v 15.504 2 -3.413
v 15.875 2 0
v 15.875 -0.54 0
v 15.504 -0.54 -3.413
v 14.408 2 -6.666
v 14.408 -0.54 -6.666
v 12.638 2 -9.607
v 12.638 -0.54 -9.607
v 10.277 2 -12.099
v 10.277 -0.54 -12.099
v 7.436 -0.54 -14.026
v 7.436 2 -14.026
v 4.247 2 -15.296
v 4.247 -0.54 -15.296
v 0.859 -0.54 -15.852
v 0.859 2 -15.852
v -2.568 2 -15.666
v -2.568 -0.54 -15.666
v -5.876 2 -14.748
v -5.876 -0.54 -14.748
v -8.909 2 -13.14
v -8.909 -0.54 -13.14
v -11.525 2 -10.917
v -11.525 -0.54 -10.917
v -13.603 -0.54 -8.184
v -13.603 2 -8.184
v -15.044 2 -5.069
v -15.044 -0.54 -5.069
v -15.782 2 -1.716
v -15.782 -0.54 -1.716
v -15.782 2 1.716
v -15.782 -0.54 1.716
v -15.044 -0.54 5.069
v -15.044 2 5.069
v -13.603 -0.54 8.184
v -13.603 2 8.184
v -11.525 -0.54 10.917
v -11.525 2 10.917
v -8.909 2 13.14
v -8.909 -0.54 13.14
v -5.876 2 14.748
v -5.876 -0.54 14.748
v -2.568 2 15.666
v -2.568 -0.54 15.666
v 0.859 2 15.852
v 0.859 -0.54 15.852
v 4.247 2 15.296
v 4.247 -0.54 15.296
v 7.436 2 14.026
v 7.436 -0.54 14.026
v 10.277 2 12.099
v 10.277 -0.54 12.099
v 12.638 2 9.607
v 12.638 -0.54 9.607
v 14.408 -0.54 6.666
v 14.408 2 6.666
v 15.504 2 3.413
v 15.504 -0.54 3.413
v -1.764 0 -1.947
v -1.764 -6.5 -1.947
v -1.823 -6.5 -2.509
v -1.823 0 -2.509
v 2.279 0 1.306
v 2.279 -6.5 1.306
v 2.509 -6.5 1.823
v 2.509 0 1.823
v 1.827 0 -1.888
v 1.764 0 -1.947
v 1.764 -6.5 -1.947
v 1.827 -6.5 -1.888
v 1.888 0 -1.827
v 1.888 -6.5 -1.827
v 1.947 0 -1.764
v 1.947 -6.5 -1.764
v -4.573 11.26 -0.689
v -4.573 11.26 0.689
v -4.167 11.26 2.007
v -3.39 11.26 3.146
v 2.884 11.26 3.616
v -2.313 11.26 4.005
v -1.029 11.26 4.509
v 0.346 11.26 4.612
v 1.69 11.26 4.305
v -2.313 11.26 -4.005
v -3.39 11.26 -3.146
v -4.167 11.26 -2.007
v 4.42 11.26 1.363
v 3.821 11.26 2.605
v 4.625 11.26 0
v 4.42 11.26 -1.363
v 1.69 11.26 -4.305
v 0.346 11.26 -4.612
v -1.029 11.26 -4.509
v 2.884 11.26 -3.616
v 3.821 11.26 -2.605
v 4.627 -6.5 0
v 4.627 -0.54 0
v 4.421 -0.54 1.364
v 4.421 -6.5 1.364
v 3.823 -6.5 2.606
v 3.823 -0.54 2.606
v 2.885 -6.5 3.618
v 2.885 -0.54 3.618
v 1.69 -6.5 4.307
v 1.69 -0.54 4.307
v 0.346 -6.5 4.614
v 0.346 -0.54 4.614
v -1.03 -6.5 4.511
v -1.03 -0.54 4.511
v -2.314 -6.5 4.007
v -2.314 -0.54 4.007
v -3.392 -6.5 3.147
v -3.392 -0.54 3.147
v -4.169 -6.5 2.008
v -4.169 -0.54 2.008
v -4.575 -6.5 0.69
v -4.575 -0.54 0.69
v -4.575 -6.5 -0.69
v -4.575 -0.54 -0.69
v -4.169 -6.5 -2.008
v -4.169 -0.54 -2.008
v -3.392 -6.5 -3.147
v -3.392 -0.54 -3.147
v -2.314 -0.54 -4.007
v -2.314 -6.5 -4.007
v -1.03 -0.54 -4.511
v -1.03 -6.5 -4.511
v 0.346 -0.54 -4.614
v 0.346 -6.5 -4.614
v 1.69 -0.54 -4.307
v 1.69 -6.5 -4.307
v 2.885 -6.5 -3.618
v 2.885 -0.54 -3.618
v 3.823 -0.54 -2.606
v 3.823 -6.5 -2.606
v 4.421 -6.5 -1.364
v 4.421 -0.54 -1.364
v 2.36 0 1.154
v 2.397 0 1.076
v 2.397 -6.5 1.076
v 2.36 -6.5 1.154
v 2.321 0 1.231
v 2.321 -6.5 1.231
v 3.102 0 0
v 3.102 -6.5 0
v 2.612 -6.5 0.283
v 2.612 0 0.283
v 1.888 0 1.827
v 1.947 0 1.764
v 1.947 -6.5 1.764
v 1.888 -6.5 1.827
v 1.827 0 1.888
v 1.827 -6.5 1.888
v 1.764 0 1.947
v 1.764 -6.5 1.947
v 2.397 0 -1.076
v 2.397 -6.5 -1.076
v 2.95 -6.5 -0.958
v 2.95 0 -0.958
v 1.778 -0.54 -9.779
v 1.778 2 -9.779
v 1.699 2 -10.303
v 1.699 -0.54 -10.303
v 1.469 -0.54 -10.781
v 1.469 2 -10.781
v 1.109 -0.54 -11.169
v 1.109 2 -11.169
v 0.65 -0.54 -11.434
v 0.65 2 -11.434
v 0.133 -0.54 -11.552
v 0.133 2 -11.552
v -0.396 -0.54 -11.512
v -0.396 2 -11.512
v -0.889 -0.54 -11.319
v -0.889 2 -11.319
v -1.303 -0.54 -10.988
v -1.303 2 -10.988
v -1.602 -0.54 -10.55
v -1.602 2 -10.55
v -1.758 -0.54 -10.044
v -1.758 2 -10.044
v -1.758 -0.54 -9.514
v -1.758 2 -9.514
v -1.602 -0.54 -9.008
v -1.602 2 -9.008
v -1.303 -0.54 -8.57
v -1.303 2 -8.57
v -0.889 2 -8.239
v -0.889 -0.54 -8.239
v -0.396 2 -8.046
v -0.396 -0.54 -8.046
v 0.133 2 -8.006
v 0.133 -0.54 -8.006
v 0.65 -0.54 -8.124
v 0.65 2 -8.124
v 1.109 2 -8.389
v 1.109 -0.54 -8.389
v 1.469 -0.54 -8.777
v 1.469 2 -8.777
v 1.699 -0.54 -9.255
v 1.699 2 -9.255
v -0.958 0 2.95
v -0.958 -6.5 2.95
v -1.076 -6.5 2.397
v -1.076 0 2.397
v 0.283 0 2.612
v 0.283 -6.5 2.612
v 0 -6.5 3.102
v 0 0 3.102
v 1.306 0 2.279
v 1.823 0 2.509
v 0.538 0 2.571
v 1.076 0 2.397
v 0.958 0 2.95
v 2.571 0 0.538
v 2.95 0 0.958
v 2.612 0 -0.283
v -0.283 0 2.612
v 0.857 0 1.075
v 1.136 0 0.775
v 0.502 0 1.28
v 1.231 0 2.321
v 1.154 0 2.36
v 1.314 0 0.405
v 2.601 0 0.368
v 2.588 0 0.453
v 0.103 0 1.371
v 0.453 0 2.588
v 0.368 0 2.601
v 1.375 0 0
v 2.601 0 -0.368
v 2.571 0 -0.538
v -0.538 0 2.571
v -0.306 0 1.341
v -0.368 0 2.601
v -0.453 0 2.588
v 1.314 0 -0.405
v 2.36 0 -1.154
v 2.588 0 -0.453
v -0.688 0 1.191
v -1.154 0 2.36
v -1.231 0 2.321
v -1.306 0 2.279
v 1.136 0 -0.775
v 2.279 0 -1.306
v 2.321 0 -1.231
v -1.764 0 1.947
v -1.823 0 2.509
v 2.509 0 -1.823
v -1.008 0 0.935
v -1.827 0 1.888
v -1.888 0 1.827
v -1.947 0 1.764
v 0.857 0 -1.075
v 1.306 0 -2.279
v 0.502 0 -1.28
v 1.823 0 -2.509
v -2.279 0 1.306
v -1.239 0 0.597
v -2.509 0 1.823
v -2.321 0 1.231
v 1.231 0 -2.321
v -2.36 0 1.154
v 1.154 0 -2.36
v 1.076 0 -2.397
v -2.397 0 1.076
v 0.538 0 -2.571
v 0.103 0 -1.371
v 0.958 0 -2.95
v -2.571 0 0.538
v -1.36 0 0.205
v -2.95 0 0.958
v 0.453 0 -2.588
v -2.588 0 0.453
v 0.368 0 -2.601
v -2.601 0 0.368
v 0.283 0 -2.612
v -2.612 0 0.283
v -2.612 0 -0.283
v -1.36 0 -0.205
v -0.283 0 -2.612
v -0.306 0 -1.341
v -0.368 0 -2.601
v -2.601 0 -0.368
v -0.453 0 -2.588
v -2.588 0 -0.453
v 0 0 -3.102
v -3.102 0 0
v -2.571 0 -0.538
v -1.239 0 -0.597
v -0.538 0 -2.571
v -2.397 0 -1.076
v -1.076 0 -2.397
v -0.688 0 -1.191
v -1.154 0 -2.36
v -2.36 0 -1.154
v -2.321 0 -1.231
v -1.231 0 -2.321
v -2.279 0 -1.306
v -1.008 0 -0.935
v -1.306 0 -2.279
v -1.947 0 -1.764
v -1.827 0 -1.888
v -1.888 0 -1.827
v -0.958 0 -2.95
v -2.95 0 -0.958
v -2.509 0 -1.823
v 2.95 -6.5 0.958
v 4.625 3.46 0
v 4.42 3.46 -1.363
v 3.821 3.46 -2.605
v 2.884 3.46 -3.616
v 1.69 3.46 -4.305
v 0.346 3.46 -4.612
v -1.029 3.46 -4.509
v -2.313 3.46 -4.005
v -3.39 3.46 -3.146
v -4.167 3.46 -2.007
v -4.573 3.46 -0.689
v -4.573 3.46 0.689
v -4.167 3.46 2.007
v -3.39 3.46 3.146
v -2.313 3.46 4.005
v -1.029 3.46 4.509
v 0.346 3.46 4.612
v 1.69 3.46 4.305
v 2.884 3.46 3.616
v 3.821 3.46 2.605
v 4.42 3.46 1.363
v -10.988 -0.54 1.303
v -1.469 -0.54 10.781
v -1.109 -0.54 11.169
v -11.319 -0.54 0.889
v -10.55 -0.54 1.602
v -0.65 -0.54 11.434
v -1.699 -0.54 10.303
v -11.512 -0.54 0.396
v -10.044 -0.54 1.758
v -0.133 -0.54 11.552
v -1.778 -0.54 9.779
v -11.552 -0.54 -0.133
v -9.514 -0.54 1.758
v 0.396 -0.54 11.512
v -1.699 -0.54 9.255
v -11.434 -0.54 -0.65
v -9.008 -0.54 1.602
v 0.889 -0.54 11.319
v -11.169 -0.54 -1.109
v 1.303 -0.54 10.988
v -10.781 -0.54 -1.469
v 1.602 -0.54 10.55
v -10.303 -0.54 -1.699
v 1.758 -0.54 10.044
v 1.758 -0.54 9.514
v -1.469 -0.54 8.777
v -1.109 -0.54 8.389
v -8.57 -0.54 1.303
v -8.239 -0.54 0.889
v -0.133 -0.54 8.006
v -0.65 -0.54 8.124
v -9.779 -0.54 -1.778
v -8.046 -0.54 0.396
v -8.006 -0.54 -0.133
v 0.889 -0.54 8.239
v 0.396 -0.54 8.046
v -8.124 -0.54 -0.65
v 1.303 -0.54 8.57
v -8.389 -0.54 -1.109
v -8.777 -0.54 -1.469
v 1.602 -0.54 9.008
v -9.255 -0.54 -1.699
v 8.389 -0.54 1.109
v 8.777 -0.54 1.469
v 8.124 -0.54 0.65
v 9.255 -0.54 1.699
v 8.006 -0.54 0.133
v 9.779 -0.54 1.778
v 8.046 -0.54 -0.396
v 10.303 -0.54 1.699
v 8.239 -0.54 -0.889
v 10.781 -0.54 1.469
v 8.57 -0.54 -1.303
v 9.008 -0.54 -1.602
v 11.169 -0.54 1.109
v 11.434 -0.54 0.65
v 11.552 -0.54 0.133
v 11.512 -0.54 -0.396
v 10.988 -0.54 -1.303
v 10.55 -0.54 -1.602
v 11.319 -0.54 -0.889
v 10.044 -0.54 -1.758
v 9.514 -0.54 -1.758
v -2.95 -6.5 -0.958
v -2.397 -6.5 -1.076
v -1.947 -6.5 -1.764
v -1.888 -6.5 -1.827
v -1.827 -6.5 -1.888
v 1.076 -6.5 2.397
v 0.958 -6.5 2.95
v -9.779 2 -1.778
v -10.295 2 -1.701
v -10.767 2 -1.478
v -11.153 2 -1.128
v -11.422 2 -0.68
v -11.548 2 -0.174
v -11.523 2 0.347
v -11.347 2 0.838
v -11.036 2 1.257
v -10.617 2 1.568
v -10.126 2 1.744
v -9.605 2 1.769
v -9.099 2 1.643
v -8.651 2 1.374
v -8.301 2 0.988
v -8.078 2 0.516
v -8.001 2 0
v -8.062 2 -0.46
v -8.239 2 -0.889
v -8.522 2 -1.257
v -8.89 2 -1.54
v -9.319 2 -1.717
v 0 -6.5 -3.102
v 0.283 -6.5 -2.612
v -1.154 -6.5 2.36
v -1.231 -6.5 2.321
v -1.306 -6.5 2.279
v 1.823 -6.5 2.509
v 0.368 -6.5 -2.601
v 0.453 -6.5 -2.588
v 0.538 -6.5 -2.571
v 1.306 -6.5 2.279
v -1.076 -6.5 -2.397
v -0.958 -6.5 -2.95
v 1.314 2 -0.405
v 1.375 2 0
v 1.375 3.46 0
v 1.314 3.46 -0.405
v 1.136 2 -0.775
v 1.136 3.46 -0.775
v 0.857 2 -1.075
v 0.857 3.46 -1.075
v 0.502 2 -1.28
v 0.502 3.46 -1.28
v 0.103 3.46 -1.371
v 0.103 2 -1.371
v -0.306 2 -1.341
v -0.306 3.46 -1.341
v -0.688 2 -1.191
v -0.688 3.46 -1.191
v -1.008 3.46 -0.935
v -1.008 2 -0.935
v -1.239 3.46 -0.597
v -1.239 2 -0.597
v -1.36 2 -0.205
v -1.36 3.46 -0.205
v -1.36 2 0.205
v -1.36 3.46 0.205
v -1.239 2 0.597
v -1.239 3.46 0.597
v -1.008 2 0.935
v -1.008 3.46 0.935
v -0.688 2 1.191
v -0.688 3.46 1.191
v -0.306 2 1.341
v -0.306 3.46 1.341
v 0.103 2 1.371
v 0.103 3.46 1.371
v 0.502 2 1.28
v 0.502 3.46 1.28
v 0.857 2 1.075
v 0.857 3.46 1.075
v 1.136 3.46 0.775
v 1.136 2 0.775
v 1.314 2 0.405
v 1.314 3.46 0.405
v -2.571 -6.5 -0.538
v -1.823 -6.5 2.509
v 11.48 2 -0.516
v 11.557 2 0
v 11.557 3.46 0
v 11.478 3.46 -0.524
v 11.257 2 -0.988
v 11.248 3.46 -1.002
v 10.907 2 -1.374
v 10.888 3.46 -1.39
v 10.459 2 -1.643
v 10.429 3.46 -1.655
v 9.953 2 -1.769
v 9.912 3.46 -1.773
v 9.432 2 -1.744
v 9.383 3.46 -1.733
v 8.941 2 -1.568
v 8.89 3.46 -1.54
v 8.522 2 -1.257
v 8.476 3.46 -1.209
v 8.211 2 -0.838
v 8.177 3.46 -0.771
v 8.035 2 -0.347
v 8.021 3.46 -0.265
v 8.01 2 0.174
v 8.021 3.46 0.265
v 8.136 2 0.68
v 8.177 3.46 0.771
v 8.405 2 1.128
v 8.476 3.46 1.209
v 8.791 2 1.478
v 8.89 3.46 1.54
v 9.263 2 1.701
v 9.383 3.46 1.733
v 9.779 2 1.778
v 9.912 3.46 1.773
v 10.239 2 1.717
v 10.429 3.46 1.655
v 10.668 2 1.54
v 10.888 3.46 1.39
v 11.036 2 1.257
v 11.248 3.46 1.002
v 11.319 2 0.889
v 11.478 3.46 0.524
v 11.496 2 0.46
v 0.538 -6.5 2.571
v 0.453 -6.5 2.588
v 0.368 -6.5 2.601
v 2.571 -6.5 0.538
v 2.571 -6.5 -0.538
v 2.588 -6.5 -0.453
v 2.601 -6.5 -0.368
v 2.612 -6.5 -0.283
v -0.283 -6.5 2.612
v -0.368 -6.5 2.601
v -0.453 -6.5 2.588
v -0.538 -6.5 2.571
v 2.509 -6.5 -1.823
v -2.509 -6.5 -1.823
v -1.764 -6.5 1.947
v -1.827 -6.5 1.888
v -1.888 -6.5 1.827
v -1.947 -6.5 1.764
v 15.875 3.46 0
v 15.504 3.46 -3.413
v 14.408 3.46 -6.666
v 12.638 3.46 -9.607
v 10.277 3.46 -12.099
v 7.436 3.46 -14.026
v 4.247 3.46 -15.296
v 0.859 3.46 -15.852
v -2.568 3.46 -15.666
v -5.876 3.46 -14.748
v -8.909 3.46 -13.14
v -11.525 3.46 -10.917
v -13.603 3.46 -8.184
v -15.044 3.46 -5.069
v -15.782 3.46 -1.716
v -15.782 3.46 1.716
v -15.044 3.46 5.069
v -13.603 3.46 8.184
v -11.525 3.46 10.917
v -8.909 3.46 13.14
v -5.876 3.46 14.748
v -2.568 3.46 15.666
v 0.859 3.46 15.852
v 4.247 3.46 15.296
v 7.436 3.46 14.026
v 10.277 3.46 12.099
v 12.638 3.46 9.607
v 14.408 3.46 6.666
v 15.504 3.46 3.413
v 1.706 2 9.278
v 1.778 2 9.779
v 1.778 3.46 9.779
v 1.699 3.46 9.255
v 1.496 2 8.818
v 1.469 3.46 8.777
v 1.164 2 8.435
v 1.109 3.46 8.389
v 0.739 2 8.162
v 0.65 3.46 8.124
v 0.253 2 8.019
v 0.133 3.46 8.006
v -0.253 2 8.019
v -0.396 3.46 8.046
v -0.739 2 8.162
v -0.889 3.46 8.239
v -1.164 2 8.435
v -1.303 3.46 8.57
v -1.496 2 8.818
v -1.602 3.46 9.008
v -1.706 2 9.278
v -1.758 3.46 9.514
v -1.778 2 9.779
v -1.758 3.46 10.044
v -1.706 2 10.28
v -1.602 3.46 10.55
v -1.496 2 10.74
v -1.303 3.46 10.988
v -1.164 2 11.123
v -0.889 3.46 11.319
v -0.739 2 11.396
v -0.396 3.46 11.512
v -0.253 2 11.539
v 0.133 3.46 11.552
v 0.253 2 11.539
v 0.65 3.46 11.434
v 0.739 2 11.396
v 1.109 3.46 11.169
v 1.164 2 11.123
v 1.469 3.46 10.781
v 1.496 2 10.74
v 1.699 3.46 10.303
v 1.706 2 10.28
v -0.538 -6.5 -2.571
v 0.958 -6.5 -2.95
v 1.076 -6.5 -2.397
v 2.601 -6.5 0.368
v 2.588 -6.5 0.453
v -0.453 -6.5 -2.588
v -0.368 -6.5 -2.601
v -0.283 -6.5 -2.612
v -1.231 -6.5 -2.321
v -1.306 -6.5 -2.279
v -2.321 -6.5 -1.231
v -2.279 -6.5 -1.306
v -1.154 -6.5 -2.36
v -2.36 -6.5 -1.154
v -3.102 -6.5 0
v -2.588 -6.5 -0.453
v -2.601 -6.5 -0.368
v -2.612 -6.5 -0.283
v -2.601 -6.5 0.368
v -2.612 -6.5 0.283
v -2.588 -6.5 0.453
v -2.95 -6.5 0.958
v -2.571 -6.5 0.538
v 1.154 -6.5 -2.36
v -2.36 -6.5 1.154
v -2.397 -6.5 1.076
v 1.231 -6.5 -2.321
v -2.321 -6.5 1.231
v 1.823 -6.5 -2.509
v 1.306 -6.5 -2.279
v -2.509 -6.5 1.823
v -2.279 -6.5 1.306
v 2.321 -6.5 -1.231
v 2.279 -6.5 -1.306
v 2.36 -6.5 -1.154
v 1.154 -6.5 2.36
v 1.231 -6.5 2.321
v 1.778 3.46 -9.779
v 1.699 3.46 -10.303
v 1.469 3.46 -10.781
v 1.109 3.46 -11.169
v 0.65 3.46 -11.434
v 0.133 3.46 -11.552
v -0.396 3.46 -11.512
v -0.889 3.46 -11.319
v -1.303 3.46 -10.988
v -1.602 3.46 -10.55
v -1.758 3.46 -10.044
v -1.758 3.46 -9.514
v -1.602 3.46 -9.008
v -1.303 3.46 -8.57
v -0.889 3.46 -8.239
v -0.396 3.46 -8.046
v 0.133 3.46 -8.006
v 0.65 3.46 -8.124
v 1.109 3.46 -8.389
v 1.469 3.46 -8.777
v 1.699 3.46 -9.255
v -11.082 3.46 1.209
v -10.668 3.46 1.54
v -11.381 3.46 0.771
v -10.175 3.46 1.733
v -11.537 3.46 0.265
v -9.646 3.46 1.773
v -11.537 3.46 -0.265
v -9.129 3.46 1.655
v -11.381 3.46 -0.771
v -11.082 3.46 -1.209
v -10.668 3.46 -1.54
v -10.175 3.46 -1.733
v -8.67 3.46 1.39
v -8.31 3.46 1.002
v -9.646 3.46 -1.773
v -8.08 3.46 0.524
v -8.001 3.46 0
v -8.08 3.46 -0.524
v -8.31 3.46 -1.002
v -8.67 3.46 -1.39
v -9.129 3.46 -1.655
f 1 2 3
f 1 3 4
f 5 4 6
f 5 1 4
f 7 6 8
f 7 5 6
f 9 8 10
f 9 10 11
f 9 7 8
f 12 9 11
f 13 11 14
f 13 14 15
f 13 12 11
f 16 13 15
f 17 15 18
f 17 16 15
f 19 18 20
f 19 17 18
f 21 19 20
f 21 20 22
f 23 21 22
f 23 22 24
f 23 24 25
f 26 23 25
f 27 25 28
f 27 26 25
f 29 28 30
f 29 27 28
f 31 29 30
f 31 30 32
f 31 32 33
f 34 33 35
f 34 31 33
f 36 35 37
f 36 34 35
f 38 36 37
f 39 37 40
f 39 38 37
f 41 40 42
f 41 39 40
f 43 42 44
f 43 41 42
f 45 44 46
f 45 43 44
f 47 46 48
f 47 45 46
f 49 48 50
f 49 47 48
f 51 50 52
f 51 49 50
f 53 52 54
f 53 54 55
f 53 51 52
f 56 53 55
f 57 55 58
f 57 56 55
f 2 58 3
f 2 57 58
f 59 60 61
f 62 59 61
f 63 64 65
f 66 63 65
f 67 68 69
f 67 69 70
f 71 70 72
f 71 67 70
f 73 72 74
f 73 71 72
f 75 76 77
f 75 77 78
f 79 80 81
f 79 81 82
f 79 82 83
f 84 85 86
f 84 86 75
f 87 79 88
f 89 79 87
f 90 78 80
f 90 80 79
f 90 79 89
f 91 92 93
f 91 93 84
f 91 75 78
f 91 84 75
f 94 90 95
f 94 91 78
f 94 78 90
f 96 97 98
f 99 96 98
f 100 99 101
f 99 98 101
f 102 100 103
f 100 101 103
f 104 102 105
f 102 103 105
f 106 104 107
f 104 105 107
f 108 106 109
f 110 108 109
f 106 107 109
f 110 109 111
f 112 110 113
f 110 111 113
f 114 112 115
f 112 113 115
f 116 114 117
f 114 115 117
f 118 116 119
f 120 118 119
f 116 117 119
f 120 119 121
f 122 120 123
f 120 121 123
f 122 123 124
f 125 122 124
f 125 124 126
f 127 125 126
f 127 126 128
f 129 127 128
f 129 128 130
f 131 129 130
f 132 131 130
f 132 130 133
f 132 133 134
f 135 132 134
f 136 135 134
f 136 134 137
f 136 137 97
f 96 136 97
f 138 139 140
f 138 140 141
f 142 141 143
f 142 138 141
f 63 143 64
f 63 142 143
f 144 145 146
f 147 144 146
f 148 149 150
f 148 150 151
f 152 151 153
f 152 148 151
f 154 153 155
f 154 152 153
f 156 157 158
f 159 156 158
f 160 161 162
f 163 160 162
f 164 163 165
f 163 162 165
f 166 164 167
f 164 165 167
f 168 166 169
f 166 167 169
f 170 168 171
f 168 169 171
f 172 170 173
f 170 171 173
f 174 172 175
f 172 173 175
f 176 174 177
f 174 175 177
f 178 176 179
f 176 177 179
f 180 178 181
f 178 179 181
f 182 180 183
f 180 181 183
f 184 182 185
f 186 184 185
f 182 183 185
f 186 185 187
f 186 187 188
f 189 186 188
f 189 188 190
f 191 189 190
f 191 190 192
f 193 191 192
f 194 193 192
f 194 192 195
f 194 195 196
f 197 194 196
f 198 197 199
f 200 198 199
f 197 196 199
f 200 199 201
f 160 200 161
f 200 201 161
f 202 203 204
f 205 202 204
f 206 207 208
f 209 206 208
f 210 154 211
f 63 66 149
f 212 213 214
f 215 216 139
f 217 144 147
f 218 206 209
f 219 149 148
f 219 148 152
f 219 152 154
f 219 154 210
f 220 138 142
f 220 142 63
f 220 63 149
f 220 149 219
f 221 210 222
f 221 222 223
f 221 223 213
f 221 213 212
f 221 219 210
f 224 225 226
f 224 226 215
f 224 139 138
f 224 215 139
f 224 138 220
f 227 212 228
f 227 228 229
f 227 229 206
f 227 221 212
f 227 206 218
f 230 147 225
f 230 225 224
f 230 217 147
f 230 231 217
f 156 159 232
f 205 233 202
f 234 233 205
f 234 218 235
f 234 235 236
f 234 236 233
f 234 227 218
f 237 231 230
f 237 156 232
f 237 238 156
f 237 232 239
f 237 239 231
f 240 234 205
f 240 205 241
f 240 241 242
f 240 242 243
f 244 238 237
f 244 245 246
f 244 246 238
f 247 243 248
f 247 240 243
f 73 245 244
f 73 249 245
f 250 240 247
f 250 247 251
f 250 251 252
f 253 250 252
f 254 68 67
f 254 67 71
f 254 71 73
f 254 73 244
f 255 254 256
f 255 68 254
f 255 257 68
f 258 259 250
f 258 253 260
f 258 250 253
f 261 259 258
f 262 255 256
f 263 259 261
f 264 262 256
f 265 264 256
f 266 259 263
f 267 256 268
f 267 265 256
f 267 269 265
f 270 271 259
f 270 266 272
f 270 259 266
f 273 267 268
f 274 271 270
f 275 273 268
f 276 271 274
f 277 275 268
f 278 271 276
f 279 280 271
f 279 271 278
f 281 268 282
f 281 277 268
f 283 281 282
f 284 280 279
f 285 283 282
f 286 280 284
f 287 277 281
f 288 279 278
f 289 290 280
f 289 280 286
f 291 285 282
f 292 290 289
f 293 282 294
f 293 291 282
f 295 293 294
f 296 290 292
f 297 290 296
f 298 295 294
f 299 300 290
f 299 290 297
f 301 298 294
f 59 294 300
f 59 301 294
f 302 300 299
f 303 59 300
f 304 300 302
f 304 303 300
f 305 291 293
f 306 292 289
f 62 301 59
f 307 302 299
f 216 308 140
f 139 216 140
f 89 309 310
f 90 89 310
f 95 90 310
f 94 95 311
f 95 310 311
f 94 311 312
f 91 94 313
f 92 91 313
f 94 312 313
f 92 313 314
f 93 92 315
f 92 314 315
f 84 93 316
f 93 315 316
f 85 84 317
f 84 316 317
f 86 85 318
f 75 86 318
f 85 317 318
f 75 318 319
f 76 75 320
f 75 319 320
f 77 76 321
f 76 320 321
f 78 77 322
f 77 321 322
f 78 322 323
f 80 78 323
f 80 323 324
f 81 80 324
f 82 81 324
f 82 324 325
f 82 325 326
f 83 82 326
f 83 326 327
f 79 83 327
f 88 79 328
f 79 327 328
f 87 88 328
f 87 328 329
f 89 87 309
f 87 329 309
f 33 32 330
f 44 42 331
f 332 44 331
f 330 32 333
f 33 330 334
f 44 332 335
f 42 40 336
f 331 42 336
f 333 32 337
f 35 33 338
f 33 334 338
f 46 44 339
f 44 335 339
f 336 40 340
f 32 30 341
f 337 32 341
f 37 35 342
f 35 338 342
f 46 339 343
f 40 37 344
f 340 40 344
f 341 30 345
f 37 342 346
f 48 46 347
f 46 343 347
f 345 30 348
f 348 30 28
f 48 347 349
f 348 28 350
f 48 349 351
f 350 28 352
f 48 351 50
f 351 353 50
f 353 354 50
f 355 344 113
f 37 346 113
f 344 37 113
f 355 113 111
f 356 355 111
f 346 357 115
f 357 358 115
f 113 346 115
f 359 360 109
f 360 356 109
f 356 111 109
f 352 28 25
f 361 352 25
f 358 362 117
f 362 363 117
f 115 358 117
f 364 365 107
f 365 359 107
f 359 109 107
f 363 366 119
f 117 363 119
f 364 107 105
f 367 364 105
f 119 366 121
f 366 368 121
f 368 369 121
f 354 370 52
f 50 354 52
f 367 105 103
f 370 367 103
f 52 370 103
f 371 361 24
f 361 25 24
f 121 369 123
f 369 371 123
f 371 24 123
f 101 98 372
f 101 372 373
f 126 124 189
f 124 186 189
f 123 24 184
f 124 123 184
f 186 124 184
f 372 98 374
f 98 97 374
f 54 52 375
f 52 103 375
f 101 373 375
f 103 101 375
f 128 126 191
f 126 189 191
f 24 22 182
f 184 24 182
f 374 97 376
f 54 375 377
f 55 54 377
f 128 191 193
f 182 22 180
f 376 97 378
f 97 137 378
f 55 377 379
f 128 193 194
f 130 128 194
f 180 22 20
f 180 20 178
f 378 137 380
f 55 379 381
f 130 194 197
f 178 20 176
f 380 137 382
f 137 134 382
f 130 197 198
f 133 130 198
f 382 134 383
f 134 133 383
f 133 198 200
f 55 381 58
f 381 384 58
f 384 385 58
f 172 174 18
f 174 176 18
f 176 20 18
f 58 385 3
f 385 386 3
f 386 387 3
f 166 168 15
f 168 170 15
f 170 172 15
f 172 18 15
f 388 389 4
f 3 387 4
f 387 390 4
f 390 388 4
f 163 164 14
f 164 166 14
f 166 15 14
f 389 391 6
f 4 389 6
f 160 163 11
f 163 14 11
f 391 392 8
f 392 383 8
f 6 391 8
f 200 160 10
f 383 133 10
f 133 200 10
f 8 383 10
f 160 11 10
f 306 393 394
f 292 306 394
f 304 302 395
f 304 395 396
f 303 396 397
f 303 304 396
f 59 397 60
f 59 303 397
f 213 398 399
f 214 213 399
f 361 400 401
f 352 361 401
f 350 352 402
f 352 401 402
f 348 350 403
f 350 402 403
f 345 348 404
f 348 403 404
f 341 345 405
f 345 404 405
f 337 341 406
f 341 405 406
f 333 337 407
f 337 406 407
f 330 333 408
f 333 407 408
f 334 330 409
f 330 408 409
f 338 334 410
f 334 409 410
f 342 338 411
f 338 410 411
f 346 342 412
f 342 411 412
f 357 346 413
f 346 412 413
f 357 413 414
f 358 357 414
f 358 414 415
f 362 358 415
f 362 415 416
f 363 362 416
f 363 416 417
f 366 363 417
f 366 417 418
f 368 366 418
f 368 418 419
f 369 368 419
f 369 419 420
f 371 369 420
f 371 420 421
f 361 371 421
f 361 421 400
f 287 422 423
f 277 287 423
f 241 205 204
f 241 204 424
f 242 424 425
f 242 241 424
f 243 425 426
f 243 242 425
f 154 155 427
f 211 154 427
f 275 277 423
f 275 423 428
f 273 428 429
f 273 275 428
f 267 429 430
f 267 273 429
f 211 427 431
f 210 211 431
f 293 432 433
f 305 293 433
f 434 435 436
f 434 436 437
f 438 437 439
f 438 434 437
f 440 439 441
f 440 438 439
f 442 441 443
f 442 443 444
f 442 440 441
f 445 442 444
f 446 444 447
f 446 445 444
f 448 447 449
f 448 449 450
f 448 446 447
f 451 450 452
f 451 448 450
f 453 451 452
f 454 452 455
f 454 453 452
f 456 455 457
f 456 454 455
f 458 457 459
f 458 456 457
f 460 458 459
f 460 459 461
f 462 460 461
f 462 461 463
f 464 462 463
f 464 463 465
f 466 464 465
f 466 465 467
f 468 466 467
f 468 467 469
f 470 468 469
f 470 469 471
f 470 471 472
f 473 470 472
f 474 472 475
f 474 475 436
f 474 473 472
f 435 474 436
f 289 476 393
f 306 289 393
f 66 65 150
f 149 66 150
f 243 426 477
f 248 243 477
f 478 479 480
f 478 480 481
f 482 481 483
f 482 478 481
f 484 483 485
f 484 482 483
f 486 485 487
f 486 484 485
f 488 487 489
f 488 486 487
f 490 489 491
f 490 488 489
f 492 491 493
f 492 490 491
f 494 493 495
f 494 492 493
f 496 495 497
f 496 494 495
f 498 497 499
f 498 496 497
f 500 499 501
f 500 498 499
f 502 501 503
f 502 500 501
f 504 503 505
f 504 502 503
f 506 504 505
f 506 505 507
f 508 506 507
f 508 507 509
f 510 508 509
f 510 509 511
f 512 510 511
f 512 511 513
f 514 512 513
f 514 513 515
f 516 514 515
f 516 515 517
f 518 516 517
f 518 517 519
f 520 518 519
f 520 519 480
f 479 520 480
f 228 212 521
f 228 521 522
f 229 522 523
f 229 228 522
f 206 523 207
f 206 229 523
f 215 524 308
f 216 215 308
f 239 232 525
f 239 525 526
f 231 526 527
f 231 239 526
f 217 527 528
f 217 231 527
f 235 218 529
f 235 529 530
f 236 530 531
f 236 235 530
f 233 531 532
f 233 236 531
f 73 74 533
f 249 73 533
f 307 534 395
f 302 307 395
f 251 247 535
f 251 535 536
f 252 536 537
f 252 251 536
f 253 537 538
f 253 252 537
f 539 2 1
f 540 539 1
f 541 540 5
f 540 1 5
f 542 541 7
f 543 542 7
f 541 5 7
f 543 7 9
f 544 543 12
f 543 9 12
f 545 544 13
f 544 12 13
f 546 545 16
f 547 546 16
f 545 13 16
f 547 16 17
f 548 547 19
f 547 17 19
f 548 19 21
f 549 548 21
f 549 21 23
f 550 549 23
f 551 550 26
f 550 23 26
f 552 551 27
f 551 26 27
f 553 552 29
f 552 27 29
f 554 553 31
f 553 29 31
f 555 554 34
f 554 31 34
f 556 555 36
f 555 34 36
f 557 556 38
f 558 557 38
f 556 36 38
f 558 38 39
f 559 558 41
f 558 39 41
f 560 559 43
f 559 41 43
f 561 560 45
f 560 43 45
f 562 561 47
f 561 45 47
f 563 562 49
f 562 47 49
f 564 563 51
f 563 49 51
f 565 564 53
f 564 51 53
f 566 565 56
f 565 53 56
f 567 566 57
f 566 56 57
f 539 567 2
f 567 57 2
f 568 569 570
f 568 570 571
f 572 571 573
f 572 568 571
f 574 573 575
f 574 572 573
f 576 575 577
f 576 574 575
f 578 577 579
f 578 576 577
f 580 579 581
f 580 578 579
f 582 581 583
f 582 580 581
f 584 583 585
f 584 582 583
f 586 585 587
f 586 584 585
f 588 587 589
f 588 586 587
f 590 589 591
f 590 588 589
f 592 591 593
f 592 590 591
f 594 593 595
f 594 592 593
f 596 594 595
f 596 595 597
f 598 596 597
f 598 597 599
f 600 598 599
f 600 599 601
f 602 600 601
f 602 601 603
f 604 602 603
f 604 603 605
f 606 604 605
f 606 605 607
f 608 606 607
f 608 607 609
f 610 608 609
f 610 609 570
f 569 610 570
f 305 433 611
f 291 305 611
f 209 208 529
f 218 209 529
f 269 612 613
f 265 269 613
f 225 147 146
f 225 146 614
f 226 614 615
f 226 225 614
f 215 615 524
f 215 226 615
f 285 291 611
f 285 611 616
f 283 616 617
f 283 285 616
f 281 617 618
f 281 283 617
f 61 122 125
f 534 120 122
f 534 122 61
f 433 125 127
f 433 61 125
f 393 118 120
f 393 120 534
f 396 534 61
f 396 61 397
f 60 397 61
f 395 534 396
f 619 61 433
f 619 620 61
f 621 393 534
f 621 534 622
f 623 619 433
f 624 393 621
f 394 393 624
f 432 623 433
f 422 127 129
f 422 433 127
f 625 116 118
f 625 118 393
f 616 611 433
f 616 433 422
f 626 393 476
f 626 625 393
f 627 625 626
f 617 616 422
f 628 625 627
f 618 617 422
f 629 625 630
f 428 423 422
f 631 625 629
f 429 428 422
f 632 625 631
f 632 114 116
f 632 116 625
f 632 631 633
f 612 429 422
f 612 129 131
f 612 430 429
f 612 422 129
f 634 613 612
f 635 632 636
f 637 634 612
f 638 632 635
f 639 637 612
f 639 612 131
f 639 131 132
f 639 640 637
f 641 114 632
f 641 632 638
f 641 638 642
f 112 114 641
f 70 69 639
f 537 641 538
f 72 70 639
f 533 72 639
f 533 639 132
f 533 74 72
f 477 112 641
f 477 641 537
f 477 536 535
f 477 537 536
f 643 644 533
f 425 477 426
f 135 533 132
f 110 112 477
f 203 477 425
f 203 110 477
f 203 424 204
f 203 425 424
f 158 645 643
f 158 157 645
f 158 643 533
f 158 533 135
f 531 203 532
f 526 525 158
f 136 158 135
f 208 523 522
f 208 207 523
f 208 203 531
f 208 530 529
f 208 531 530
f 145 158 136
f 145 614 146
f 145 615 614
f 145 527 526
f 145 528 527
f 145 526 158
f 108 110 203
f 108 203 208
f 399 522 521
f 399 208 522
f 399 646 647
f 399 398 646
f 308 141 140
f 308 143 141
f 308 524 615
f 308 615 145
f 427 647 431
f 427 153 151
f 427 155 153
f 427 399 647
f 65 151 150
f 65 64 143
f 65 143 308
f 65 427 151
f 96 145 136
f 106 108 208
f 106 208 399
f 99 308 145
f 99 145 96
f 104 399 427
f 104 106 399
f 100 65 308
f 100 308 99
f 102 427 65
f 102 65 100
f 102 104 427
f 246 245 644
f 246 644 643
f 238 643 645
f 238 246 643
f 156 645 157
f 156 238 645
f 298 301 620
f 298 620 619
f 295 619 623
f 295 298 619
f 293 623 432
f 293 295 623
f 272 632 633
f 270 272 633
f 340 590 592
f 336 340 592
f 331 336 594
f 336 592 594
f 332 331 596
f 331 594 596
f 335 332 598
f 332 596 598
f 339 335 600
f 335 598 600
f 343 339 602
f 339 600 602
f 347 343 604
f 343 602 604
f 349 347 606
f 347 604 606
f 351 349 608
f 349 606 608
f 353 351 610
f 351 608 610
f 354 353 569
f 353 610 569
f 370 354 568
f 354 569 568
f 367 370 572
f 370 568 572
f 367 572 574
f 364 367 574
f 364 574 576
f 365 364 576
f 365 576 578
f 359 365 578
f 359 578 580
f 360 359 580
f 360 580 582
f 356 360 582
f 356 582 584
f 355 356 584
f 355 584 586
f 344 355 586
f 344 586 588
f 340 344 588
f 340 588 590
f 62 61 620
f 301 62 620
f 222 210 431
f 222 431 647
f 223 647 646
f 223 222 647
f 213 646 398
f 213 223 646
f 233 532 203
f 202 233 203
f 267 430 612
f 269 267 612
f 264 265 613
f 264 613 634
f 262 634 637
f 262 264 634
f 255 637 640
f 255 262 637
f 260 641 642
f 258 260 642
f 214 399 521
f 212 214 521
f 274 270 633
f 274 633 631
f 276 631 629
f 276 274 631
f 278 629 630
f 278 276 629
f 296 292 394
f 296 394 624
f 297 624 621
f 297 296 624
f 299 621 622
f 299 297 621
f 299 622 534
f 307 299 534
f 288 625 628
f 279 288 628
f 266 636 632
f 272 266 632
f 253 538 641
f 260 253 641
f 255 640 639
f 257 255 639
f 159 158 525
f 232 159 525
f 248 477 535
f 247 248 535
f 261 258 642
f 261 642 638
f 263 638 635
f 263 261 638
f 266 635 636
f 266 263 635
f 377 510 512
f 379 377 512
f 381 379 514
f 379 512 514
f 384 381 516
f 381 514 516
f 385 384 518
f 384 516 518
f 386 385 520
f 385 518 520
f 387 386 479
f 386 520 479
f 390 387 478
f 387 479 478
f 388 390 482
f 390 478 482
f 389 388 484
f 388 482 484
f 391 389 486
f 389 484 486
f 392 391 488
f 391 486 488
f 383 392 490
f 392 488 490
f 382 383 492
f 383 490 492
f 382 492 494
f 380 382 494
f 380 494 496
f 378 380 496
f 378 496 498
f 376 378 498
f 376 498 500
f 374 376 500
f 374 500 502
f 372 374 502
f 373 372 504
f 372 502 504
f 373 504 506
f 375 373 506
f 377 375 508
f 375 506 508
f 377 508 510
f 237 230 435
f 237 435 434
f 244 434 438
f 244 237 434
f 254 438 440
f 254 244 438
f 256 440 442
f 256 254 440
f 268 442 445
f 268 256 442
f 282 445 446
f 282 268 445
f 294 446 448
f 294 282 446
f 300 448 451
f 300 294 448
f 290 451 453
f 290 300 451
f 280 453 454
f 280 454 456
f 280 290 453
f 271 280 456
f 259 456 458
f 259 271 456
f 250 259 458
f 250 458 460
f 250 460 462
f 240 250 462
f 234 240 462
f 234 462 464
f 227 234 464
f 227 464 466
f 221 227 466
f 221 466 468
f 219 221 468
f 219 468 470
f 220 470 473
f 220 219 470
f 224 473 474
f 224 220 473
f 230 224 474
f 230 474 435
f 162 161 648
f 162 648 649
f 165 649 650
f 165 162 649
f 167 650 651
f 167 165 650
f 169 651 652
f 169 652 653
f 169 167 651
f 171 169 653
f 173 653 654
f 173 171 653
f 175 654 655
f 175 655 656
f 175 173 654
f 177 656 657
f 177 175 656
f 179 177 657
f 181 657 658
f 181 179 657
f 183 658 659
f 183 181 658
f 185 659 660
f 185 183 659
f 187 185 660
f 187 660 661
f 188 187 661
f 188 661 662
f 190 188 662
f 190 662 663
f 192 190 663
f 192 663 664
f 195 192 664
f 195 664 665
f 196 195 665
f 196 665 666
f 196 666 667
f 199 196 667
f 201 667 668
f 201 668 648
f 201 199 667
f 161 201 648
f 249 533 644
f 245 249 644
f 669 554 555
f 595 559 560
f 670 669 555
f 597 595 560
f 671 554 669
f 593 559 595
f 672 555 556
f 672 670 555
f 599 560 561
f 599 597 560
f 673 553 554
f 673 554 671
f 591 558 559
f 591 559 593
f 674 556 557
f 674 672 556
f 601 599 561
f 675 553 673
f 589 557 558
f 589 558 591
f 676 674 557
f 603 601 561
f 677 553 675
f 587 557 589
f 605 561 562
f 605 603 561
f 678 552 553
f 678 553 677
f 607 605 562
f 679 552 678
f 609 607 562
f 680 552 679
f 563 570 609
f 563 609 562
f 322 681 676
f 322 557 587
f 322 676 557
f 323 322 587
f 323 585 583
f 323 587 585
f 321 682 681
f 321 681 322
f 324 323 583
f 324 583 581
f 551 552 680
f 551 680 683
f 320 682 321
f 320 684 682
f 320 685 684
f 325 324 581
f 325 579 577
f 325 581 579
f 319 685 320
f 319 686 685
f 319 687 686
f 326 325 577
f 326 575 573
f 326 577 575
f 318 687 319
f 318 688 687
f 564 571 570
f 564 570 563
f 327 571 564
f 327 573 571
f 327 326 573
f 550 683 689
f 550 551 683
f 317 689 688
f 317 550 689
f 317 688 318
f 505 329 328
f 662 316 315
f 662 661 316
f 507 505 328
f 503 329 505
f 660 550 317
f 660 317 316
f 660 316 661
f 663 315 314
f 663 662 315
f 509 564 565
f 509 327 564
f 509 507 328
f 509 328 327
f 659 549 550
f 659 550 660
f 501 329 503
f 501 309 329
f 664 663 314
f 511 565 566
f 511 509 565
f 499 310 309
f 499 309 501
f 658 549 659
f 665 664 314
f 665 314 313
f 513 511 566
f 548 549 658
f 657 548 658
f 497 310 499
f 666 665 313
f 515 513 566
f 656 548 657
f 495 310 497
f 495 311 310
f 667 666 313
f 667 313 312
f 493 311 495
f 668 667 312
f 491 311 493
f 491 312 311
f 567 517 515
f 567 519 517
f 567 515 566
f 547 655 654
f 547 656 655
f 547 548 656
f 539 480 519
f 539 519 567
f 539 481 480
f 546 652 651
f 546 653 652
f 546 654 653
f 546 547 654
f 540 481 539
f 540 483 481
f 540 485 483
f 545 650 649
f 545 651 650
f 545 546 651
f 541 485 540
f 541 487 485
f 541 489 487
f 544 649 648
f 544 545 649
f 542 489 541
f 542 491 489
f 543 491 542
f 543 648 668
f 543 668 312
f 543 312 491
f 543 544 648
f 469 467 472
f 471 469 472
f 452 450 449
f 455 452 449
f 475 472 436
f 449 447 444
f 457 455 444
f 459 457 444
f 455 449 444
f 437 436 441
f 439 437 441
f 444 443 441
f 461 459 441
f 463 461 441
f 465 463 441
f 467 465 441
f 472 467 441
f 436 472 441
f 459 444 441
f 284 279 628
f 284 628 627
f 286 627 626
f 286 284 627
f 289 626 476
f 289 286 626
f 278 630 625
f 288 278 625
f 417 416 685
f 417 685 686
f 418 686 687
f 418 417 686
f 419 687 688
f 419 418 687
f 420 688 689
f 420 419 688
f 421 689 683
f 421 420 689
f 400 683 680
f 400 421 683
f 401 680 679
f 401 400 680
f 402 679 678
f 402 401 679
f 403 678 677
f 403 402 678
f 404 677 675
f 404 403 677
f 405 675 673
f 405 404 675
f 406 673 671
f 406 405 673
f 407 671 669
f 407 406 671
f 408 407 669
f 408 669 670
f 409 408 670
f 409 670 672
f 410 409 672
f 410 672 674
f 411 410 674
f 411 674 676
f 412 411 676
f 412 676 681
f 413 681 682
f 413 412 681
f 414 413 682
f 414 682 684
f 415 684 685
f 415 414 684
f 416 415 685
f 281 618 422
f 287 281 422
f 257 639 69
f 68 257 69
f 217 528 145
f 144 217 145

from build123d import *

# Parameters (mm, degrees)
SKETCH1_R           = 0.5
SKETCH1_R_2         = 1.375
BOSS_EXTRUDE1_DEPTH = 2
SKETCH4_R           = 4.6270037
SKETCH4_R_2         = 2.6270037
BOSS_EXTRUDE3_DEPTH = 6.5
CUT_EXTRUDE3_DEPTH  = 6.5
SKETCH6_R           = 15.875
SKETCH6_R_2         = 3.75
BOSS_EXTRUDE6_DEPTH = 2.54
SKETCH7_R           = 1.778
CUT_EXTRUDE4_DEPTH  = 2.54
CIRPATTERN1_COUNT   = 4
ESQUISSE1_R         = 15.875
ESQUISSE1_R_2       = 1.375
ESQUISSE1_R_3       = 1.778
BOSS_EXTRU_1_DEPTH  = 1.46
ESQUISSE2_R         = 4.625
BOSS_EXTRU_2_DEPTH  = 7.8


with BuildPart() as part:
    # Sketch1 → Boss-Extrude1 (new body)
    with BuildSketch(Plane(origin=(0, 0, 0), x_dir=(1, 0, 0), z_dir=(0, 1, 0))):
        with BuildLine():
            Line((-4, 4), (-2.467435953, 13.402193757))
            ThreePointArc((-2.467435953, 13.402193757), (0, 15.5), (2.467435953, 13.402193757))
            Line((2.467435953, 13.402193757), (4, 4))
            Line((4, 4), (12.448472752, 2.459445505))
            ThreePointArc((12.448472752, 2.459445505), (14.5, 0), (12.448472752, -2.459445505))
            Line((12.448472752, -2.459445505), (4, -4))
            Line((4, -4), (2.467435953, -13.402193757))
            ThreePointArc((2.467435953, -13.402193757), (0, -15.5), (-2.467435953, -13.402193757))
            Line((-2.467435953, -13.402193757), (-4, -4))
            Line((-4, -4), (-12.448472752, -2.459445505))
            ThreePointArc((-12.448472752, -2.459445505), (-14.5, 0), (-12.448472752, 2.459445505))
            Line((-12.448472752, 2.459445505), (-4, 4))
        make_face()
        with Locations((0, 12)):
            Circle(SKETCH1_R, mode=Mode.SUBTRACT)
        with Locations((0, 9.5)):
            Circle(SKETCH1_R, mode=Mode.SUBTRACT)
        with Locations((0, 7.5)):
            Circle(SKETCH1_R, mode=Mode.SUBTRACT)
        with Locations((12, 0)):
            Circle(SKETCH1_R, mode=Mode.SUBTRACT)
        with Locations((9.5, 0)):
            Circle(SKETCH1_R, mode=Mode.SUBTRACT)
        with Locations((7.5, 0)):
            Circle(SKETCH1_R, mode=Mode.SUBTRACT)
        with Locations((0, -12)):
            Circle(SKETCH1_R, mode=Mode.SUBTRACT)
        with Locations((0, -9.5)):
            Circle(SKETCH1_R, mode=Mode.SUBTRACT)
        with Locations((0, -7.5)):
            Circle(SKETCH1_R, mode=Mode.SUBTRACT)
        with Locations((-12, 0)):
            Circle(SKETCH1_R, mode=Mode.SUBTRACT)
        with Locations((-9.5, 0)):
            Circle(SKETCH1_R, mode=Mode.SUBTRACT)
        with Locations((-7.5, 0)):
            Circle(SKETCH1_R, mode=Mode.SUBTRACT)
        Circle(SKETCH1_R_2, mode=Mode.SUBTRACT)
    extrude(amount=BOSS_EXTRUDE1_DEPTH)

    # Sketch4 → Boss-Extrude3 (add)
    with BuildSketch(Plane.XZ):
        Circle(SKETCH4_R)
        Circle(SKETCH4_R_2, mode=Mode.SUBTRACT)
    extrude(amount=BOSS_EXTRUDE3_DEPTH)

    # Sketch5 → Cut-Extrude3 (cut)
    with BuildSketch(Plane.XZ.offset(6.5)):
        with BuildLine():
            Line((0.282820055, 2.611735296), (0, 3.101594))
            Line((0, 3.101594), (-0.282820055, 2.611735296))
            ThreePointArc((-0.282820055, 2.611735296), (0, 2.6270037), (0.282820055, 2.611735296))
        make_face()
        with BuildLine():
            ThreePointArc((-1.076048447, 2.396511669), (-0.811788788, 2.498428987), (-0.538092735, 2.571304075))
            Line((-0.538092735, 2.571304075), (-0.958445256, 2.949791185))
            Line((-0.958445256, 2.949791185), (-1.076048447, 2.396511669))
        make_face()
        with BuildLine():
            Line((0.958445256, 2.949791185), (0.538092735, 2.571304075))
            ThreePointArc((0.538092735, 2.571304075), (0.811788788, 2.498428987), (1.076048447, 2.396511669))
            Line((1.076048447, 2.396511669), (0.958445256, 2.949791185))
        make_face()
        with BuildLine():
            ThreePointArc((-1.76394572, 1.946700782), (-1.544114033, 2.125290638), (-1.306333259, 2.279175696))
            Line((-1.306333259, 2.279175696), (-1.823071212, 2.509242256))
            Line((-1.823071212, 2.509242256), (-1.76394572, 1.946700782))
        make_face()
        with BuildLine():
            Line((1.823071212, 2.509242256), (1.306333259, 2.279175696))
            ThreePointArc((1.306333259, 2.279175696), (1.544114033, 2.125290638), (1.76394572, 1.946700782))
            Line((1.76394572, 1.946700782), (1.823071212, 2.509242256))
        make_face()
        with BuildLine():
            ThreePointArc((-2.279175696, 1.306333259), (-2.125290638, 1.544114033), (-1.946700782, 1.76394572))
            Line((-1.946700782, 1.76394572), (-2.509242256, 1.823071212))
            Line((-2.509242256, 1.823071212), (-2.279175696, 1.306333259))
        make_face()
        with BuildLine():
            Line((2.509242256, 1.823071212), (1.946700782, 1.76394572))
            ThreePointArc((1.946700782, 1.76394572), (2.125290638, 1.544114033), (2.279175696, 1.306333259))
            Line((2.279175696, 1.306333259), (2.509242256, 1.823071212))
        make_face()
        with BuildLine():
            ThreePointArc((-2.571304075, 0.538092735), (-2.498428987, 0.811788788), (-2.396511669, 1.076048447))
            Line((-2.396511669, 1.076048447), (-2.949791185, 0.958445256))
            Line((-2.949791185, 0.958445256), (-2.571304075, 0.538092735))
        make_face()
        with BuildLine():
            Line((2.949791185, 0.958445256), (2.396511669, 1.076048447))
            ThreePointArc((2.396511669, 1.076048447), (2.498428987, 0.811788788), (2.571304075, 0.538092735))
            Line((2.571304075, 0.538092735), (2.949791185, 0.958445256))
        make_face()
        with BuildLine():
            ThreePointArc((-2.611735296, -0.282820055), (-2.6270037, 0), (-2.611735296, 0.282820055))
            Line((-2.611735296, 0.282820055), (-3.101594, 0))
            Line((-3.101594, 0), (-2.611735296, -0.282820055))
        make_face()
        with BuildLine():
            Line((3.101594, 0), (2.611735296, 0.282820055))
            ThreePointArc((2.611735296, 0.282820055), (2.6270037, 0), (2.611735296, -0.282820055))
            Line((2.611735296, -0.282820055), (3.101594, 0))
        make_face()
        with BuildLine():
            ThreePointArc((-2.396511669, -1.076048447), (-2.498428987, -0.811788788), (-2.571304075, -0.538092735))
            Line((-2.571304075, -0.538092735), (-2.949791185, -0.958445256))
            Line((-2.949791185, -0.958445256), (-2.396511669, -1.076048447))
        make_face()
        with BuildLine():
            Line((2.949791185, -0.958445256), (2.571304075, -0.538092735))
            ThreePointArc((2.571304075, -0.538092735), (2.498428987, -0.811788788), (2.396511669, -1.076048447))
            Line((2.396511669, -1.076048447), (2.949791185, -0.958445256))
        make_face()
        with BuildLine():
            ThreePointArc((-1.946700782, -1.76394572), (-2.125290638, -1.544114033), (-2.279175696, -1.306333259))
            Line((-2.279175696, -1.306333259), (-2.509242256, -1.823071212))
            Line((-2.509242256, -1.823071212), (-1.946700782, -1.76394572))
        make_face()
        with BuildLine():
            Line((2.509242256, -1.823071212), (2.279175696, -1.306333259))
            ThreePointArc((2.279175696, -1.306333259), (2.125290638, -1.544114033), (1.946700782, -1.76394572))
            Line((1.946700782, -1.76394572), (2.509242256, -1.823071212))
        make_face()
        with BuildLine():
            ThreePointArc((-1.306333259, -2.279175696), (-1.544114033, -2.125290638), (-1.76394572, -1.946700782))
            Line((-1.76394572, -1.946700782), (-1.823071212, -2.509242256))
            Line((-1.823071212, -2.509242256), (-1.306333259, -2.279175696))
        make_face()
        with BuildLine():
            Line((1.823071212, -2.509242256), (1.76394572, -1.946700782))
            ThreePointArc((1.76394572, -1.946700782), (1.544114033, -2.125290638), (1.306333259, -2.279175696))
            Line((1.306333259, -2.279175696), (1.823071212, -2.509242256))
        make_face()
        with BuildLine():
            ThreePointArc((-0.538092735, -2.571304075), (-0.811788788, -2.498428987), (-1.076048447, -2.396511669))
            Line((-1.076048447, -2.396511669), (-0.958445256, -2.949791185))
            Line((-0.958445256, -2.949791185), (-0.538092735, -2.571304075))
        make_face()
        with BuildLine():
            Line((0.958445256, -2.949791185), (1.076048447, -2.396511669))
            ThreePointArc((1.076048447, -2.396511669), (0.811788788, -2.498428987), (0.538092735, -2.571304075))
            Line((0.538092735, -2.571304075), (0.958445256, -2.949791185))
        make_face()
        with BuildLine():
            ThreePointArc((0.282820055, -2.611735296), (0, -2.6270037), (-0.282820055, -2.611735296))
            Line((-0.282820055, -2.611735296), (0, -3.101594))
            Line((0, -3.101594), (0.282820055, -2.611735296))
        make_face()
    extrude(amount=-CUT_EXTRUDE3_DEPTH, mode=Mode.SUBTRACT)

    # Sketch6 → Boss-Extrude6 (add)
    with BuildSketch(Plane(origin=(0, 2, 0), x_dir=(1, 0, 0), z_dir=(0, 1, 0))):
        Circle(SKETCH6_R)
        Circle(SKETCH6_R_2, mode=Mode.SUBTRACT)
    extrude(amount=-BOSS_EXTRUDE6_DEPTH)

    # Sketch7 → Cut-Extrude4 (cut)
    with BuildSketch(Plane(origin=(0, 2, 0), x_dir=(1, 0, 0), z_dir=(0, 1, 0))):
        with Locations((0, 9.779)):
            Circle(SKETCH7_R)
    cut_extrude4 = extrude(amount=-CUT_EXTRUDE4_DEPTH, mode=Mode.SUBTRACT)

    # CirPattern1: Cut-Extrude4 ×4 about axis
    cirpattern1_axis = Axis((0, 0, 0), (0, 1, 0))
    for i in range(1, CIRPATTERN1_COUNT):
        add(cut_extrude4.rotate(cirpattern1_axis, i * 360 / CIRPATTERN1_COUNT), mode=Mode.SUBTRACT)

    # Esquisse1 → Boss.-Extru.1 (add)
    with BuildSketch(Plane(origin=(0, 2, 0), x_dir=(1, 0, 0), z_dir=(0, 1, 0))):
        Circle(ESQUISSE1_R)
        Circle(ESQUISSE1_R_2, mode=Mode.SUBTRACT)
        with Locations((0, 9.779)):
            Circle(ESQUISSE1_R_3, mode=Mode.SUBTRACT)
        with Locations((9.779, 0)):
            Circle(ESQUISSE1_R_3, mode=Mode.SUBTRACT)
        with Locations((0, -9.779)):
            Circle(ESQUISSE1_R_3, mode=Mode.SUBTRACT)
        with Locations((-9.779, 0)):
            Circle(ESQUISSE1_R_3, mode=Mode.SUBTRACT)
    extrude(amount=BOSS_EXTRU_1_DEPTH)

    # Esquisse2 → Boss.-Extru.2 (add)
    with BuildSketch(Plane(origin=(0, 3.46, 0), x_dir=(1, 0, 0), z_dir=(0, 1, 0))):
        Circle(ESQUISSE2_R)
    extrude(amount=BOSS_EXTRU_2_DEPTH)


solid = part.part
